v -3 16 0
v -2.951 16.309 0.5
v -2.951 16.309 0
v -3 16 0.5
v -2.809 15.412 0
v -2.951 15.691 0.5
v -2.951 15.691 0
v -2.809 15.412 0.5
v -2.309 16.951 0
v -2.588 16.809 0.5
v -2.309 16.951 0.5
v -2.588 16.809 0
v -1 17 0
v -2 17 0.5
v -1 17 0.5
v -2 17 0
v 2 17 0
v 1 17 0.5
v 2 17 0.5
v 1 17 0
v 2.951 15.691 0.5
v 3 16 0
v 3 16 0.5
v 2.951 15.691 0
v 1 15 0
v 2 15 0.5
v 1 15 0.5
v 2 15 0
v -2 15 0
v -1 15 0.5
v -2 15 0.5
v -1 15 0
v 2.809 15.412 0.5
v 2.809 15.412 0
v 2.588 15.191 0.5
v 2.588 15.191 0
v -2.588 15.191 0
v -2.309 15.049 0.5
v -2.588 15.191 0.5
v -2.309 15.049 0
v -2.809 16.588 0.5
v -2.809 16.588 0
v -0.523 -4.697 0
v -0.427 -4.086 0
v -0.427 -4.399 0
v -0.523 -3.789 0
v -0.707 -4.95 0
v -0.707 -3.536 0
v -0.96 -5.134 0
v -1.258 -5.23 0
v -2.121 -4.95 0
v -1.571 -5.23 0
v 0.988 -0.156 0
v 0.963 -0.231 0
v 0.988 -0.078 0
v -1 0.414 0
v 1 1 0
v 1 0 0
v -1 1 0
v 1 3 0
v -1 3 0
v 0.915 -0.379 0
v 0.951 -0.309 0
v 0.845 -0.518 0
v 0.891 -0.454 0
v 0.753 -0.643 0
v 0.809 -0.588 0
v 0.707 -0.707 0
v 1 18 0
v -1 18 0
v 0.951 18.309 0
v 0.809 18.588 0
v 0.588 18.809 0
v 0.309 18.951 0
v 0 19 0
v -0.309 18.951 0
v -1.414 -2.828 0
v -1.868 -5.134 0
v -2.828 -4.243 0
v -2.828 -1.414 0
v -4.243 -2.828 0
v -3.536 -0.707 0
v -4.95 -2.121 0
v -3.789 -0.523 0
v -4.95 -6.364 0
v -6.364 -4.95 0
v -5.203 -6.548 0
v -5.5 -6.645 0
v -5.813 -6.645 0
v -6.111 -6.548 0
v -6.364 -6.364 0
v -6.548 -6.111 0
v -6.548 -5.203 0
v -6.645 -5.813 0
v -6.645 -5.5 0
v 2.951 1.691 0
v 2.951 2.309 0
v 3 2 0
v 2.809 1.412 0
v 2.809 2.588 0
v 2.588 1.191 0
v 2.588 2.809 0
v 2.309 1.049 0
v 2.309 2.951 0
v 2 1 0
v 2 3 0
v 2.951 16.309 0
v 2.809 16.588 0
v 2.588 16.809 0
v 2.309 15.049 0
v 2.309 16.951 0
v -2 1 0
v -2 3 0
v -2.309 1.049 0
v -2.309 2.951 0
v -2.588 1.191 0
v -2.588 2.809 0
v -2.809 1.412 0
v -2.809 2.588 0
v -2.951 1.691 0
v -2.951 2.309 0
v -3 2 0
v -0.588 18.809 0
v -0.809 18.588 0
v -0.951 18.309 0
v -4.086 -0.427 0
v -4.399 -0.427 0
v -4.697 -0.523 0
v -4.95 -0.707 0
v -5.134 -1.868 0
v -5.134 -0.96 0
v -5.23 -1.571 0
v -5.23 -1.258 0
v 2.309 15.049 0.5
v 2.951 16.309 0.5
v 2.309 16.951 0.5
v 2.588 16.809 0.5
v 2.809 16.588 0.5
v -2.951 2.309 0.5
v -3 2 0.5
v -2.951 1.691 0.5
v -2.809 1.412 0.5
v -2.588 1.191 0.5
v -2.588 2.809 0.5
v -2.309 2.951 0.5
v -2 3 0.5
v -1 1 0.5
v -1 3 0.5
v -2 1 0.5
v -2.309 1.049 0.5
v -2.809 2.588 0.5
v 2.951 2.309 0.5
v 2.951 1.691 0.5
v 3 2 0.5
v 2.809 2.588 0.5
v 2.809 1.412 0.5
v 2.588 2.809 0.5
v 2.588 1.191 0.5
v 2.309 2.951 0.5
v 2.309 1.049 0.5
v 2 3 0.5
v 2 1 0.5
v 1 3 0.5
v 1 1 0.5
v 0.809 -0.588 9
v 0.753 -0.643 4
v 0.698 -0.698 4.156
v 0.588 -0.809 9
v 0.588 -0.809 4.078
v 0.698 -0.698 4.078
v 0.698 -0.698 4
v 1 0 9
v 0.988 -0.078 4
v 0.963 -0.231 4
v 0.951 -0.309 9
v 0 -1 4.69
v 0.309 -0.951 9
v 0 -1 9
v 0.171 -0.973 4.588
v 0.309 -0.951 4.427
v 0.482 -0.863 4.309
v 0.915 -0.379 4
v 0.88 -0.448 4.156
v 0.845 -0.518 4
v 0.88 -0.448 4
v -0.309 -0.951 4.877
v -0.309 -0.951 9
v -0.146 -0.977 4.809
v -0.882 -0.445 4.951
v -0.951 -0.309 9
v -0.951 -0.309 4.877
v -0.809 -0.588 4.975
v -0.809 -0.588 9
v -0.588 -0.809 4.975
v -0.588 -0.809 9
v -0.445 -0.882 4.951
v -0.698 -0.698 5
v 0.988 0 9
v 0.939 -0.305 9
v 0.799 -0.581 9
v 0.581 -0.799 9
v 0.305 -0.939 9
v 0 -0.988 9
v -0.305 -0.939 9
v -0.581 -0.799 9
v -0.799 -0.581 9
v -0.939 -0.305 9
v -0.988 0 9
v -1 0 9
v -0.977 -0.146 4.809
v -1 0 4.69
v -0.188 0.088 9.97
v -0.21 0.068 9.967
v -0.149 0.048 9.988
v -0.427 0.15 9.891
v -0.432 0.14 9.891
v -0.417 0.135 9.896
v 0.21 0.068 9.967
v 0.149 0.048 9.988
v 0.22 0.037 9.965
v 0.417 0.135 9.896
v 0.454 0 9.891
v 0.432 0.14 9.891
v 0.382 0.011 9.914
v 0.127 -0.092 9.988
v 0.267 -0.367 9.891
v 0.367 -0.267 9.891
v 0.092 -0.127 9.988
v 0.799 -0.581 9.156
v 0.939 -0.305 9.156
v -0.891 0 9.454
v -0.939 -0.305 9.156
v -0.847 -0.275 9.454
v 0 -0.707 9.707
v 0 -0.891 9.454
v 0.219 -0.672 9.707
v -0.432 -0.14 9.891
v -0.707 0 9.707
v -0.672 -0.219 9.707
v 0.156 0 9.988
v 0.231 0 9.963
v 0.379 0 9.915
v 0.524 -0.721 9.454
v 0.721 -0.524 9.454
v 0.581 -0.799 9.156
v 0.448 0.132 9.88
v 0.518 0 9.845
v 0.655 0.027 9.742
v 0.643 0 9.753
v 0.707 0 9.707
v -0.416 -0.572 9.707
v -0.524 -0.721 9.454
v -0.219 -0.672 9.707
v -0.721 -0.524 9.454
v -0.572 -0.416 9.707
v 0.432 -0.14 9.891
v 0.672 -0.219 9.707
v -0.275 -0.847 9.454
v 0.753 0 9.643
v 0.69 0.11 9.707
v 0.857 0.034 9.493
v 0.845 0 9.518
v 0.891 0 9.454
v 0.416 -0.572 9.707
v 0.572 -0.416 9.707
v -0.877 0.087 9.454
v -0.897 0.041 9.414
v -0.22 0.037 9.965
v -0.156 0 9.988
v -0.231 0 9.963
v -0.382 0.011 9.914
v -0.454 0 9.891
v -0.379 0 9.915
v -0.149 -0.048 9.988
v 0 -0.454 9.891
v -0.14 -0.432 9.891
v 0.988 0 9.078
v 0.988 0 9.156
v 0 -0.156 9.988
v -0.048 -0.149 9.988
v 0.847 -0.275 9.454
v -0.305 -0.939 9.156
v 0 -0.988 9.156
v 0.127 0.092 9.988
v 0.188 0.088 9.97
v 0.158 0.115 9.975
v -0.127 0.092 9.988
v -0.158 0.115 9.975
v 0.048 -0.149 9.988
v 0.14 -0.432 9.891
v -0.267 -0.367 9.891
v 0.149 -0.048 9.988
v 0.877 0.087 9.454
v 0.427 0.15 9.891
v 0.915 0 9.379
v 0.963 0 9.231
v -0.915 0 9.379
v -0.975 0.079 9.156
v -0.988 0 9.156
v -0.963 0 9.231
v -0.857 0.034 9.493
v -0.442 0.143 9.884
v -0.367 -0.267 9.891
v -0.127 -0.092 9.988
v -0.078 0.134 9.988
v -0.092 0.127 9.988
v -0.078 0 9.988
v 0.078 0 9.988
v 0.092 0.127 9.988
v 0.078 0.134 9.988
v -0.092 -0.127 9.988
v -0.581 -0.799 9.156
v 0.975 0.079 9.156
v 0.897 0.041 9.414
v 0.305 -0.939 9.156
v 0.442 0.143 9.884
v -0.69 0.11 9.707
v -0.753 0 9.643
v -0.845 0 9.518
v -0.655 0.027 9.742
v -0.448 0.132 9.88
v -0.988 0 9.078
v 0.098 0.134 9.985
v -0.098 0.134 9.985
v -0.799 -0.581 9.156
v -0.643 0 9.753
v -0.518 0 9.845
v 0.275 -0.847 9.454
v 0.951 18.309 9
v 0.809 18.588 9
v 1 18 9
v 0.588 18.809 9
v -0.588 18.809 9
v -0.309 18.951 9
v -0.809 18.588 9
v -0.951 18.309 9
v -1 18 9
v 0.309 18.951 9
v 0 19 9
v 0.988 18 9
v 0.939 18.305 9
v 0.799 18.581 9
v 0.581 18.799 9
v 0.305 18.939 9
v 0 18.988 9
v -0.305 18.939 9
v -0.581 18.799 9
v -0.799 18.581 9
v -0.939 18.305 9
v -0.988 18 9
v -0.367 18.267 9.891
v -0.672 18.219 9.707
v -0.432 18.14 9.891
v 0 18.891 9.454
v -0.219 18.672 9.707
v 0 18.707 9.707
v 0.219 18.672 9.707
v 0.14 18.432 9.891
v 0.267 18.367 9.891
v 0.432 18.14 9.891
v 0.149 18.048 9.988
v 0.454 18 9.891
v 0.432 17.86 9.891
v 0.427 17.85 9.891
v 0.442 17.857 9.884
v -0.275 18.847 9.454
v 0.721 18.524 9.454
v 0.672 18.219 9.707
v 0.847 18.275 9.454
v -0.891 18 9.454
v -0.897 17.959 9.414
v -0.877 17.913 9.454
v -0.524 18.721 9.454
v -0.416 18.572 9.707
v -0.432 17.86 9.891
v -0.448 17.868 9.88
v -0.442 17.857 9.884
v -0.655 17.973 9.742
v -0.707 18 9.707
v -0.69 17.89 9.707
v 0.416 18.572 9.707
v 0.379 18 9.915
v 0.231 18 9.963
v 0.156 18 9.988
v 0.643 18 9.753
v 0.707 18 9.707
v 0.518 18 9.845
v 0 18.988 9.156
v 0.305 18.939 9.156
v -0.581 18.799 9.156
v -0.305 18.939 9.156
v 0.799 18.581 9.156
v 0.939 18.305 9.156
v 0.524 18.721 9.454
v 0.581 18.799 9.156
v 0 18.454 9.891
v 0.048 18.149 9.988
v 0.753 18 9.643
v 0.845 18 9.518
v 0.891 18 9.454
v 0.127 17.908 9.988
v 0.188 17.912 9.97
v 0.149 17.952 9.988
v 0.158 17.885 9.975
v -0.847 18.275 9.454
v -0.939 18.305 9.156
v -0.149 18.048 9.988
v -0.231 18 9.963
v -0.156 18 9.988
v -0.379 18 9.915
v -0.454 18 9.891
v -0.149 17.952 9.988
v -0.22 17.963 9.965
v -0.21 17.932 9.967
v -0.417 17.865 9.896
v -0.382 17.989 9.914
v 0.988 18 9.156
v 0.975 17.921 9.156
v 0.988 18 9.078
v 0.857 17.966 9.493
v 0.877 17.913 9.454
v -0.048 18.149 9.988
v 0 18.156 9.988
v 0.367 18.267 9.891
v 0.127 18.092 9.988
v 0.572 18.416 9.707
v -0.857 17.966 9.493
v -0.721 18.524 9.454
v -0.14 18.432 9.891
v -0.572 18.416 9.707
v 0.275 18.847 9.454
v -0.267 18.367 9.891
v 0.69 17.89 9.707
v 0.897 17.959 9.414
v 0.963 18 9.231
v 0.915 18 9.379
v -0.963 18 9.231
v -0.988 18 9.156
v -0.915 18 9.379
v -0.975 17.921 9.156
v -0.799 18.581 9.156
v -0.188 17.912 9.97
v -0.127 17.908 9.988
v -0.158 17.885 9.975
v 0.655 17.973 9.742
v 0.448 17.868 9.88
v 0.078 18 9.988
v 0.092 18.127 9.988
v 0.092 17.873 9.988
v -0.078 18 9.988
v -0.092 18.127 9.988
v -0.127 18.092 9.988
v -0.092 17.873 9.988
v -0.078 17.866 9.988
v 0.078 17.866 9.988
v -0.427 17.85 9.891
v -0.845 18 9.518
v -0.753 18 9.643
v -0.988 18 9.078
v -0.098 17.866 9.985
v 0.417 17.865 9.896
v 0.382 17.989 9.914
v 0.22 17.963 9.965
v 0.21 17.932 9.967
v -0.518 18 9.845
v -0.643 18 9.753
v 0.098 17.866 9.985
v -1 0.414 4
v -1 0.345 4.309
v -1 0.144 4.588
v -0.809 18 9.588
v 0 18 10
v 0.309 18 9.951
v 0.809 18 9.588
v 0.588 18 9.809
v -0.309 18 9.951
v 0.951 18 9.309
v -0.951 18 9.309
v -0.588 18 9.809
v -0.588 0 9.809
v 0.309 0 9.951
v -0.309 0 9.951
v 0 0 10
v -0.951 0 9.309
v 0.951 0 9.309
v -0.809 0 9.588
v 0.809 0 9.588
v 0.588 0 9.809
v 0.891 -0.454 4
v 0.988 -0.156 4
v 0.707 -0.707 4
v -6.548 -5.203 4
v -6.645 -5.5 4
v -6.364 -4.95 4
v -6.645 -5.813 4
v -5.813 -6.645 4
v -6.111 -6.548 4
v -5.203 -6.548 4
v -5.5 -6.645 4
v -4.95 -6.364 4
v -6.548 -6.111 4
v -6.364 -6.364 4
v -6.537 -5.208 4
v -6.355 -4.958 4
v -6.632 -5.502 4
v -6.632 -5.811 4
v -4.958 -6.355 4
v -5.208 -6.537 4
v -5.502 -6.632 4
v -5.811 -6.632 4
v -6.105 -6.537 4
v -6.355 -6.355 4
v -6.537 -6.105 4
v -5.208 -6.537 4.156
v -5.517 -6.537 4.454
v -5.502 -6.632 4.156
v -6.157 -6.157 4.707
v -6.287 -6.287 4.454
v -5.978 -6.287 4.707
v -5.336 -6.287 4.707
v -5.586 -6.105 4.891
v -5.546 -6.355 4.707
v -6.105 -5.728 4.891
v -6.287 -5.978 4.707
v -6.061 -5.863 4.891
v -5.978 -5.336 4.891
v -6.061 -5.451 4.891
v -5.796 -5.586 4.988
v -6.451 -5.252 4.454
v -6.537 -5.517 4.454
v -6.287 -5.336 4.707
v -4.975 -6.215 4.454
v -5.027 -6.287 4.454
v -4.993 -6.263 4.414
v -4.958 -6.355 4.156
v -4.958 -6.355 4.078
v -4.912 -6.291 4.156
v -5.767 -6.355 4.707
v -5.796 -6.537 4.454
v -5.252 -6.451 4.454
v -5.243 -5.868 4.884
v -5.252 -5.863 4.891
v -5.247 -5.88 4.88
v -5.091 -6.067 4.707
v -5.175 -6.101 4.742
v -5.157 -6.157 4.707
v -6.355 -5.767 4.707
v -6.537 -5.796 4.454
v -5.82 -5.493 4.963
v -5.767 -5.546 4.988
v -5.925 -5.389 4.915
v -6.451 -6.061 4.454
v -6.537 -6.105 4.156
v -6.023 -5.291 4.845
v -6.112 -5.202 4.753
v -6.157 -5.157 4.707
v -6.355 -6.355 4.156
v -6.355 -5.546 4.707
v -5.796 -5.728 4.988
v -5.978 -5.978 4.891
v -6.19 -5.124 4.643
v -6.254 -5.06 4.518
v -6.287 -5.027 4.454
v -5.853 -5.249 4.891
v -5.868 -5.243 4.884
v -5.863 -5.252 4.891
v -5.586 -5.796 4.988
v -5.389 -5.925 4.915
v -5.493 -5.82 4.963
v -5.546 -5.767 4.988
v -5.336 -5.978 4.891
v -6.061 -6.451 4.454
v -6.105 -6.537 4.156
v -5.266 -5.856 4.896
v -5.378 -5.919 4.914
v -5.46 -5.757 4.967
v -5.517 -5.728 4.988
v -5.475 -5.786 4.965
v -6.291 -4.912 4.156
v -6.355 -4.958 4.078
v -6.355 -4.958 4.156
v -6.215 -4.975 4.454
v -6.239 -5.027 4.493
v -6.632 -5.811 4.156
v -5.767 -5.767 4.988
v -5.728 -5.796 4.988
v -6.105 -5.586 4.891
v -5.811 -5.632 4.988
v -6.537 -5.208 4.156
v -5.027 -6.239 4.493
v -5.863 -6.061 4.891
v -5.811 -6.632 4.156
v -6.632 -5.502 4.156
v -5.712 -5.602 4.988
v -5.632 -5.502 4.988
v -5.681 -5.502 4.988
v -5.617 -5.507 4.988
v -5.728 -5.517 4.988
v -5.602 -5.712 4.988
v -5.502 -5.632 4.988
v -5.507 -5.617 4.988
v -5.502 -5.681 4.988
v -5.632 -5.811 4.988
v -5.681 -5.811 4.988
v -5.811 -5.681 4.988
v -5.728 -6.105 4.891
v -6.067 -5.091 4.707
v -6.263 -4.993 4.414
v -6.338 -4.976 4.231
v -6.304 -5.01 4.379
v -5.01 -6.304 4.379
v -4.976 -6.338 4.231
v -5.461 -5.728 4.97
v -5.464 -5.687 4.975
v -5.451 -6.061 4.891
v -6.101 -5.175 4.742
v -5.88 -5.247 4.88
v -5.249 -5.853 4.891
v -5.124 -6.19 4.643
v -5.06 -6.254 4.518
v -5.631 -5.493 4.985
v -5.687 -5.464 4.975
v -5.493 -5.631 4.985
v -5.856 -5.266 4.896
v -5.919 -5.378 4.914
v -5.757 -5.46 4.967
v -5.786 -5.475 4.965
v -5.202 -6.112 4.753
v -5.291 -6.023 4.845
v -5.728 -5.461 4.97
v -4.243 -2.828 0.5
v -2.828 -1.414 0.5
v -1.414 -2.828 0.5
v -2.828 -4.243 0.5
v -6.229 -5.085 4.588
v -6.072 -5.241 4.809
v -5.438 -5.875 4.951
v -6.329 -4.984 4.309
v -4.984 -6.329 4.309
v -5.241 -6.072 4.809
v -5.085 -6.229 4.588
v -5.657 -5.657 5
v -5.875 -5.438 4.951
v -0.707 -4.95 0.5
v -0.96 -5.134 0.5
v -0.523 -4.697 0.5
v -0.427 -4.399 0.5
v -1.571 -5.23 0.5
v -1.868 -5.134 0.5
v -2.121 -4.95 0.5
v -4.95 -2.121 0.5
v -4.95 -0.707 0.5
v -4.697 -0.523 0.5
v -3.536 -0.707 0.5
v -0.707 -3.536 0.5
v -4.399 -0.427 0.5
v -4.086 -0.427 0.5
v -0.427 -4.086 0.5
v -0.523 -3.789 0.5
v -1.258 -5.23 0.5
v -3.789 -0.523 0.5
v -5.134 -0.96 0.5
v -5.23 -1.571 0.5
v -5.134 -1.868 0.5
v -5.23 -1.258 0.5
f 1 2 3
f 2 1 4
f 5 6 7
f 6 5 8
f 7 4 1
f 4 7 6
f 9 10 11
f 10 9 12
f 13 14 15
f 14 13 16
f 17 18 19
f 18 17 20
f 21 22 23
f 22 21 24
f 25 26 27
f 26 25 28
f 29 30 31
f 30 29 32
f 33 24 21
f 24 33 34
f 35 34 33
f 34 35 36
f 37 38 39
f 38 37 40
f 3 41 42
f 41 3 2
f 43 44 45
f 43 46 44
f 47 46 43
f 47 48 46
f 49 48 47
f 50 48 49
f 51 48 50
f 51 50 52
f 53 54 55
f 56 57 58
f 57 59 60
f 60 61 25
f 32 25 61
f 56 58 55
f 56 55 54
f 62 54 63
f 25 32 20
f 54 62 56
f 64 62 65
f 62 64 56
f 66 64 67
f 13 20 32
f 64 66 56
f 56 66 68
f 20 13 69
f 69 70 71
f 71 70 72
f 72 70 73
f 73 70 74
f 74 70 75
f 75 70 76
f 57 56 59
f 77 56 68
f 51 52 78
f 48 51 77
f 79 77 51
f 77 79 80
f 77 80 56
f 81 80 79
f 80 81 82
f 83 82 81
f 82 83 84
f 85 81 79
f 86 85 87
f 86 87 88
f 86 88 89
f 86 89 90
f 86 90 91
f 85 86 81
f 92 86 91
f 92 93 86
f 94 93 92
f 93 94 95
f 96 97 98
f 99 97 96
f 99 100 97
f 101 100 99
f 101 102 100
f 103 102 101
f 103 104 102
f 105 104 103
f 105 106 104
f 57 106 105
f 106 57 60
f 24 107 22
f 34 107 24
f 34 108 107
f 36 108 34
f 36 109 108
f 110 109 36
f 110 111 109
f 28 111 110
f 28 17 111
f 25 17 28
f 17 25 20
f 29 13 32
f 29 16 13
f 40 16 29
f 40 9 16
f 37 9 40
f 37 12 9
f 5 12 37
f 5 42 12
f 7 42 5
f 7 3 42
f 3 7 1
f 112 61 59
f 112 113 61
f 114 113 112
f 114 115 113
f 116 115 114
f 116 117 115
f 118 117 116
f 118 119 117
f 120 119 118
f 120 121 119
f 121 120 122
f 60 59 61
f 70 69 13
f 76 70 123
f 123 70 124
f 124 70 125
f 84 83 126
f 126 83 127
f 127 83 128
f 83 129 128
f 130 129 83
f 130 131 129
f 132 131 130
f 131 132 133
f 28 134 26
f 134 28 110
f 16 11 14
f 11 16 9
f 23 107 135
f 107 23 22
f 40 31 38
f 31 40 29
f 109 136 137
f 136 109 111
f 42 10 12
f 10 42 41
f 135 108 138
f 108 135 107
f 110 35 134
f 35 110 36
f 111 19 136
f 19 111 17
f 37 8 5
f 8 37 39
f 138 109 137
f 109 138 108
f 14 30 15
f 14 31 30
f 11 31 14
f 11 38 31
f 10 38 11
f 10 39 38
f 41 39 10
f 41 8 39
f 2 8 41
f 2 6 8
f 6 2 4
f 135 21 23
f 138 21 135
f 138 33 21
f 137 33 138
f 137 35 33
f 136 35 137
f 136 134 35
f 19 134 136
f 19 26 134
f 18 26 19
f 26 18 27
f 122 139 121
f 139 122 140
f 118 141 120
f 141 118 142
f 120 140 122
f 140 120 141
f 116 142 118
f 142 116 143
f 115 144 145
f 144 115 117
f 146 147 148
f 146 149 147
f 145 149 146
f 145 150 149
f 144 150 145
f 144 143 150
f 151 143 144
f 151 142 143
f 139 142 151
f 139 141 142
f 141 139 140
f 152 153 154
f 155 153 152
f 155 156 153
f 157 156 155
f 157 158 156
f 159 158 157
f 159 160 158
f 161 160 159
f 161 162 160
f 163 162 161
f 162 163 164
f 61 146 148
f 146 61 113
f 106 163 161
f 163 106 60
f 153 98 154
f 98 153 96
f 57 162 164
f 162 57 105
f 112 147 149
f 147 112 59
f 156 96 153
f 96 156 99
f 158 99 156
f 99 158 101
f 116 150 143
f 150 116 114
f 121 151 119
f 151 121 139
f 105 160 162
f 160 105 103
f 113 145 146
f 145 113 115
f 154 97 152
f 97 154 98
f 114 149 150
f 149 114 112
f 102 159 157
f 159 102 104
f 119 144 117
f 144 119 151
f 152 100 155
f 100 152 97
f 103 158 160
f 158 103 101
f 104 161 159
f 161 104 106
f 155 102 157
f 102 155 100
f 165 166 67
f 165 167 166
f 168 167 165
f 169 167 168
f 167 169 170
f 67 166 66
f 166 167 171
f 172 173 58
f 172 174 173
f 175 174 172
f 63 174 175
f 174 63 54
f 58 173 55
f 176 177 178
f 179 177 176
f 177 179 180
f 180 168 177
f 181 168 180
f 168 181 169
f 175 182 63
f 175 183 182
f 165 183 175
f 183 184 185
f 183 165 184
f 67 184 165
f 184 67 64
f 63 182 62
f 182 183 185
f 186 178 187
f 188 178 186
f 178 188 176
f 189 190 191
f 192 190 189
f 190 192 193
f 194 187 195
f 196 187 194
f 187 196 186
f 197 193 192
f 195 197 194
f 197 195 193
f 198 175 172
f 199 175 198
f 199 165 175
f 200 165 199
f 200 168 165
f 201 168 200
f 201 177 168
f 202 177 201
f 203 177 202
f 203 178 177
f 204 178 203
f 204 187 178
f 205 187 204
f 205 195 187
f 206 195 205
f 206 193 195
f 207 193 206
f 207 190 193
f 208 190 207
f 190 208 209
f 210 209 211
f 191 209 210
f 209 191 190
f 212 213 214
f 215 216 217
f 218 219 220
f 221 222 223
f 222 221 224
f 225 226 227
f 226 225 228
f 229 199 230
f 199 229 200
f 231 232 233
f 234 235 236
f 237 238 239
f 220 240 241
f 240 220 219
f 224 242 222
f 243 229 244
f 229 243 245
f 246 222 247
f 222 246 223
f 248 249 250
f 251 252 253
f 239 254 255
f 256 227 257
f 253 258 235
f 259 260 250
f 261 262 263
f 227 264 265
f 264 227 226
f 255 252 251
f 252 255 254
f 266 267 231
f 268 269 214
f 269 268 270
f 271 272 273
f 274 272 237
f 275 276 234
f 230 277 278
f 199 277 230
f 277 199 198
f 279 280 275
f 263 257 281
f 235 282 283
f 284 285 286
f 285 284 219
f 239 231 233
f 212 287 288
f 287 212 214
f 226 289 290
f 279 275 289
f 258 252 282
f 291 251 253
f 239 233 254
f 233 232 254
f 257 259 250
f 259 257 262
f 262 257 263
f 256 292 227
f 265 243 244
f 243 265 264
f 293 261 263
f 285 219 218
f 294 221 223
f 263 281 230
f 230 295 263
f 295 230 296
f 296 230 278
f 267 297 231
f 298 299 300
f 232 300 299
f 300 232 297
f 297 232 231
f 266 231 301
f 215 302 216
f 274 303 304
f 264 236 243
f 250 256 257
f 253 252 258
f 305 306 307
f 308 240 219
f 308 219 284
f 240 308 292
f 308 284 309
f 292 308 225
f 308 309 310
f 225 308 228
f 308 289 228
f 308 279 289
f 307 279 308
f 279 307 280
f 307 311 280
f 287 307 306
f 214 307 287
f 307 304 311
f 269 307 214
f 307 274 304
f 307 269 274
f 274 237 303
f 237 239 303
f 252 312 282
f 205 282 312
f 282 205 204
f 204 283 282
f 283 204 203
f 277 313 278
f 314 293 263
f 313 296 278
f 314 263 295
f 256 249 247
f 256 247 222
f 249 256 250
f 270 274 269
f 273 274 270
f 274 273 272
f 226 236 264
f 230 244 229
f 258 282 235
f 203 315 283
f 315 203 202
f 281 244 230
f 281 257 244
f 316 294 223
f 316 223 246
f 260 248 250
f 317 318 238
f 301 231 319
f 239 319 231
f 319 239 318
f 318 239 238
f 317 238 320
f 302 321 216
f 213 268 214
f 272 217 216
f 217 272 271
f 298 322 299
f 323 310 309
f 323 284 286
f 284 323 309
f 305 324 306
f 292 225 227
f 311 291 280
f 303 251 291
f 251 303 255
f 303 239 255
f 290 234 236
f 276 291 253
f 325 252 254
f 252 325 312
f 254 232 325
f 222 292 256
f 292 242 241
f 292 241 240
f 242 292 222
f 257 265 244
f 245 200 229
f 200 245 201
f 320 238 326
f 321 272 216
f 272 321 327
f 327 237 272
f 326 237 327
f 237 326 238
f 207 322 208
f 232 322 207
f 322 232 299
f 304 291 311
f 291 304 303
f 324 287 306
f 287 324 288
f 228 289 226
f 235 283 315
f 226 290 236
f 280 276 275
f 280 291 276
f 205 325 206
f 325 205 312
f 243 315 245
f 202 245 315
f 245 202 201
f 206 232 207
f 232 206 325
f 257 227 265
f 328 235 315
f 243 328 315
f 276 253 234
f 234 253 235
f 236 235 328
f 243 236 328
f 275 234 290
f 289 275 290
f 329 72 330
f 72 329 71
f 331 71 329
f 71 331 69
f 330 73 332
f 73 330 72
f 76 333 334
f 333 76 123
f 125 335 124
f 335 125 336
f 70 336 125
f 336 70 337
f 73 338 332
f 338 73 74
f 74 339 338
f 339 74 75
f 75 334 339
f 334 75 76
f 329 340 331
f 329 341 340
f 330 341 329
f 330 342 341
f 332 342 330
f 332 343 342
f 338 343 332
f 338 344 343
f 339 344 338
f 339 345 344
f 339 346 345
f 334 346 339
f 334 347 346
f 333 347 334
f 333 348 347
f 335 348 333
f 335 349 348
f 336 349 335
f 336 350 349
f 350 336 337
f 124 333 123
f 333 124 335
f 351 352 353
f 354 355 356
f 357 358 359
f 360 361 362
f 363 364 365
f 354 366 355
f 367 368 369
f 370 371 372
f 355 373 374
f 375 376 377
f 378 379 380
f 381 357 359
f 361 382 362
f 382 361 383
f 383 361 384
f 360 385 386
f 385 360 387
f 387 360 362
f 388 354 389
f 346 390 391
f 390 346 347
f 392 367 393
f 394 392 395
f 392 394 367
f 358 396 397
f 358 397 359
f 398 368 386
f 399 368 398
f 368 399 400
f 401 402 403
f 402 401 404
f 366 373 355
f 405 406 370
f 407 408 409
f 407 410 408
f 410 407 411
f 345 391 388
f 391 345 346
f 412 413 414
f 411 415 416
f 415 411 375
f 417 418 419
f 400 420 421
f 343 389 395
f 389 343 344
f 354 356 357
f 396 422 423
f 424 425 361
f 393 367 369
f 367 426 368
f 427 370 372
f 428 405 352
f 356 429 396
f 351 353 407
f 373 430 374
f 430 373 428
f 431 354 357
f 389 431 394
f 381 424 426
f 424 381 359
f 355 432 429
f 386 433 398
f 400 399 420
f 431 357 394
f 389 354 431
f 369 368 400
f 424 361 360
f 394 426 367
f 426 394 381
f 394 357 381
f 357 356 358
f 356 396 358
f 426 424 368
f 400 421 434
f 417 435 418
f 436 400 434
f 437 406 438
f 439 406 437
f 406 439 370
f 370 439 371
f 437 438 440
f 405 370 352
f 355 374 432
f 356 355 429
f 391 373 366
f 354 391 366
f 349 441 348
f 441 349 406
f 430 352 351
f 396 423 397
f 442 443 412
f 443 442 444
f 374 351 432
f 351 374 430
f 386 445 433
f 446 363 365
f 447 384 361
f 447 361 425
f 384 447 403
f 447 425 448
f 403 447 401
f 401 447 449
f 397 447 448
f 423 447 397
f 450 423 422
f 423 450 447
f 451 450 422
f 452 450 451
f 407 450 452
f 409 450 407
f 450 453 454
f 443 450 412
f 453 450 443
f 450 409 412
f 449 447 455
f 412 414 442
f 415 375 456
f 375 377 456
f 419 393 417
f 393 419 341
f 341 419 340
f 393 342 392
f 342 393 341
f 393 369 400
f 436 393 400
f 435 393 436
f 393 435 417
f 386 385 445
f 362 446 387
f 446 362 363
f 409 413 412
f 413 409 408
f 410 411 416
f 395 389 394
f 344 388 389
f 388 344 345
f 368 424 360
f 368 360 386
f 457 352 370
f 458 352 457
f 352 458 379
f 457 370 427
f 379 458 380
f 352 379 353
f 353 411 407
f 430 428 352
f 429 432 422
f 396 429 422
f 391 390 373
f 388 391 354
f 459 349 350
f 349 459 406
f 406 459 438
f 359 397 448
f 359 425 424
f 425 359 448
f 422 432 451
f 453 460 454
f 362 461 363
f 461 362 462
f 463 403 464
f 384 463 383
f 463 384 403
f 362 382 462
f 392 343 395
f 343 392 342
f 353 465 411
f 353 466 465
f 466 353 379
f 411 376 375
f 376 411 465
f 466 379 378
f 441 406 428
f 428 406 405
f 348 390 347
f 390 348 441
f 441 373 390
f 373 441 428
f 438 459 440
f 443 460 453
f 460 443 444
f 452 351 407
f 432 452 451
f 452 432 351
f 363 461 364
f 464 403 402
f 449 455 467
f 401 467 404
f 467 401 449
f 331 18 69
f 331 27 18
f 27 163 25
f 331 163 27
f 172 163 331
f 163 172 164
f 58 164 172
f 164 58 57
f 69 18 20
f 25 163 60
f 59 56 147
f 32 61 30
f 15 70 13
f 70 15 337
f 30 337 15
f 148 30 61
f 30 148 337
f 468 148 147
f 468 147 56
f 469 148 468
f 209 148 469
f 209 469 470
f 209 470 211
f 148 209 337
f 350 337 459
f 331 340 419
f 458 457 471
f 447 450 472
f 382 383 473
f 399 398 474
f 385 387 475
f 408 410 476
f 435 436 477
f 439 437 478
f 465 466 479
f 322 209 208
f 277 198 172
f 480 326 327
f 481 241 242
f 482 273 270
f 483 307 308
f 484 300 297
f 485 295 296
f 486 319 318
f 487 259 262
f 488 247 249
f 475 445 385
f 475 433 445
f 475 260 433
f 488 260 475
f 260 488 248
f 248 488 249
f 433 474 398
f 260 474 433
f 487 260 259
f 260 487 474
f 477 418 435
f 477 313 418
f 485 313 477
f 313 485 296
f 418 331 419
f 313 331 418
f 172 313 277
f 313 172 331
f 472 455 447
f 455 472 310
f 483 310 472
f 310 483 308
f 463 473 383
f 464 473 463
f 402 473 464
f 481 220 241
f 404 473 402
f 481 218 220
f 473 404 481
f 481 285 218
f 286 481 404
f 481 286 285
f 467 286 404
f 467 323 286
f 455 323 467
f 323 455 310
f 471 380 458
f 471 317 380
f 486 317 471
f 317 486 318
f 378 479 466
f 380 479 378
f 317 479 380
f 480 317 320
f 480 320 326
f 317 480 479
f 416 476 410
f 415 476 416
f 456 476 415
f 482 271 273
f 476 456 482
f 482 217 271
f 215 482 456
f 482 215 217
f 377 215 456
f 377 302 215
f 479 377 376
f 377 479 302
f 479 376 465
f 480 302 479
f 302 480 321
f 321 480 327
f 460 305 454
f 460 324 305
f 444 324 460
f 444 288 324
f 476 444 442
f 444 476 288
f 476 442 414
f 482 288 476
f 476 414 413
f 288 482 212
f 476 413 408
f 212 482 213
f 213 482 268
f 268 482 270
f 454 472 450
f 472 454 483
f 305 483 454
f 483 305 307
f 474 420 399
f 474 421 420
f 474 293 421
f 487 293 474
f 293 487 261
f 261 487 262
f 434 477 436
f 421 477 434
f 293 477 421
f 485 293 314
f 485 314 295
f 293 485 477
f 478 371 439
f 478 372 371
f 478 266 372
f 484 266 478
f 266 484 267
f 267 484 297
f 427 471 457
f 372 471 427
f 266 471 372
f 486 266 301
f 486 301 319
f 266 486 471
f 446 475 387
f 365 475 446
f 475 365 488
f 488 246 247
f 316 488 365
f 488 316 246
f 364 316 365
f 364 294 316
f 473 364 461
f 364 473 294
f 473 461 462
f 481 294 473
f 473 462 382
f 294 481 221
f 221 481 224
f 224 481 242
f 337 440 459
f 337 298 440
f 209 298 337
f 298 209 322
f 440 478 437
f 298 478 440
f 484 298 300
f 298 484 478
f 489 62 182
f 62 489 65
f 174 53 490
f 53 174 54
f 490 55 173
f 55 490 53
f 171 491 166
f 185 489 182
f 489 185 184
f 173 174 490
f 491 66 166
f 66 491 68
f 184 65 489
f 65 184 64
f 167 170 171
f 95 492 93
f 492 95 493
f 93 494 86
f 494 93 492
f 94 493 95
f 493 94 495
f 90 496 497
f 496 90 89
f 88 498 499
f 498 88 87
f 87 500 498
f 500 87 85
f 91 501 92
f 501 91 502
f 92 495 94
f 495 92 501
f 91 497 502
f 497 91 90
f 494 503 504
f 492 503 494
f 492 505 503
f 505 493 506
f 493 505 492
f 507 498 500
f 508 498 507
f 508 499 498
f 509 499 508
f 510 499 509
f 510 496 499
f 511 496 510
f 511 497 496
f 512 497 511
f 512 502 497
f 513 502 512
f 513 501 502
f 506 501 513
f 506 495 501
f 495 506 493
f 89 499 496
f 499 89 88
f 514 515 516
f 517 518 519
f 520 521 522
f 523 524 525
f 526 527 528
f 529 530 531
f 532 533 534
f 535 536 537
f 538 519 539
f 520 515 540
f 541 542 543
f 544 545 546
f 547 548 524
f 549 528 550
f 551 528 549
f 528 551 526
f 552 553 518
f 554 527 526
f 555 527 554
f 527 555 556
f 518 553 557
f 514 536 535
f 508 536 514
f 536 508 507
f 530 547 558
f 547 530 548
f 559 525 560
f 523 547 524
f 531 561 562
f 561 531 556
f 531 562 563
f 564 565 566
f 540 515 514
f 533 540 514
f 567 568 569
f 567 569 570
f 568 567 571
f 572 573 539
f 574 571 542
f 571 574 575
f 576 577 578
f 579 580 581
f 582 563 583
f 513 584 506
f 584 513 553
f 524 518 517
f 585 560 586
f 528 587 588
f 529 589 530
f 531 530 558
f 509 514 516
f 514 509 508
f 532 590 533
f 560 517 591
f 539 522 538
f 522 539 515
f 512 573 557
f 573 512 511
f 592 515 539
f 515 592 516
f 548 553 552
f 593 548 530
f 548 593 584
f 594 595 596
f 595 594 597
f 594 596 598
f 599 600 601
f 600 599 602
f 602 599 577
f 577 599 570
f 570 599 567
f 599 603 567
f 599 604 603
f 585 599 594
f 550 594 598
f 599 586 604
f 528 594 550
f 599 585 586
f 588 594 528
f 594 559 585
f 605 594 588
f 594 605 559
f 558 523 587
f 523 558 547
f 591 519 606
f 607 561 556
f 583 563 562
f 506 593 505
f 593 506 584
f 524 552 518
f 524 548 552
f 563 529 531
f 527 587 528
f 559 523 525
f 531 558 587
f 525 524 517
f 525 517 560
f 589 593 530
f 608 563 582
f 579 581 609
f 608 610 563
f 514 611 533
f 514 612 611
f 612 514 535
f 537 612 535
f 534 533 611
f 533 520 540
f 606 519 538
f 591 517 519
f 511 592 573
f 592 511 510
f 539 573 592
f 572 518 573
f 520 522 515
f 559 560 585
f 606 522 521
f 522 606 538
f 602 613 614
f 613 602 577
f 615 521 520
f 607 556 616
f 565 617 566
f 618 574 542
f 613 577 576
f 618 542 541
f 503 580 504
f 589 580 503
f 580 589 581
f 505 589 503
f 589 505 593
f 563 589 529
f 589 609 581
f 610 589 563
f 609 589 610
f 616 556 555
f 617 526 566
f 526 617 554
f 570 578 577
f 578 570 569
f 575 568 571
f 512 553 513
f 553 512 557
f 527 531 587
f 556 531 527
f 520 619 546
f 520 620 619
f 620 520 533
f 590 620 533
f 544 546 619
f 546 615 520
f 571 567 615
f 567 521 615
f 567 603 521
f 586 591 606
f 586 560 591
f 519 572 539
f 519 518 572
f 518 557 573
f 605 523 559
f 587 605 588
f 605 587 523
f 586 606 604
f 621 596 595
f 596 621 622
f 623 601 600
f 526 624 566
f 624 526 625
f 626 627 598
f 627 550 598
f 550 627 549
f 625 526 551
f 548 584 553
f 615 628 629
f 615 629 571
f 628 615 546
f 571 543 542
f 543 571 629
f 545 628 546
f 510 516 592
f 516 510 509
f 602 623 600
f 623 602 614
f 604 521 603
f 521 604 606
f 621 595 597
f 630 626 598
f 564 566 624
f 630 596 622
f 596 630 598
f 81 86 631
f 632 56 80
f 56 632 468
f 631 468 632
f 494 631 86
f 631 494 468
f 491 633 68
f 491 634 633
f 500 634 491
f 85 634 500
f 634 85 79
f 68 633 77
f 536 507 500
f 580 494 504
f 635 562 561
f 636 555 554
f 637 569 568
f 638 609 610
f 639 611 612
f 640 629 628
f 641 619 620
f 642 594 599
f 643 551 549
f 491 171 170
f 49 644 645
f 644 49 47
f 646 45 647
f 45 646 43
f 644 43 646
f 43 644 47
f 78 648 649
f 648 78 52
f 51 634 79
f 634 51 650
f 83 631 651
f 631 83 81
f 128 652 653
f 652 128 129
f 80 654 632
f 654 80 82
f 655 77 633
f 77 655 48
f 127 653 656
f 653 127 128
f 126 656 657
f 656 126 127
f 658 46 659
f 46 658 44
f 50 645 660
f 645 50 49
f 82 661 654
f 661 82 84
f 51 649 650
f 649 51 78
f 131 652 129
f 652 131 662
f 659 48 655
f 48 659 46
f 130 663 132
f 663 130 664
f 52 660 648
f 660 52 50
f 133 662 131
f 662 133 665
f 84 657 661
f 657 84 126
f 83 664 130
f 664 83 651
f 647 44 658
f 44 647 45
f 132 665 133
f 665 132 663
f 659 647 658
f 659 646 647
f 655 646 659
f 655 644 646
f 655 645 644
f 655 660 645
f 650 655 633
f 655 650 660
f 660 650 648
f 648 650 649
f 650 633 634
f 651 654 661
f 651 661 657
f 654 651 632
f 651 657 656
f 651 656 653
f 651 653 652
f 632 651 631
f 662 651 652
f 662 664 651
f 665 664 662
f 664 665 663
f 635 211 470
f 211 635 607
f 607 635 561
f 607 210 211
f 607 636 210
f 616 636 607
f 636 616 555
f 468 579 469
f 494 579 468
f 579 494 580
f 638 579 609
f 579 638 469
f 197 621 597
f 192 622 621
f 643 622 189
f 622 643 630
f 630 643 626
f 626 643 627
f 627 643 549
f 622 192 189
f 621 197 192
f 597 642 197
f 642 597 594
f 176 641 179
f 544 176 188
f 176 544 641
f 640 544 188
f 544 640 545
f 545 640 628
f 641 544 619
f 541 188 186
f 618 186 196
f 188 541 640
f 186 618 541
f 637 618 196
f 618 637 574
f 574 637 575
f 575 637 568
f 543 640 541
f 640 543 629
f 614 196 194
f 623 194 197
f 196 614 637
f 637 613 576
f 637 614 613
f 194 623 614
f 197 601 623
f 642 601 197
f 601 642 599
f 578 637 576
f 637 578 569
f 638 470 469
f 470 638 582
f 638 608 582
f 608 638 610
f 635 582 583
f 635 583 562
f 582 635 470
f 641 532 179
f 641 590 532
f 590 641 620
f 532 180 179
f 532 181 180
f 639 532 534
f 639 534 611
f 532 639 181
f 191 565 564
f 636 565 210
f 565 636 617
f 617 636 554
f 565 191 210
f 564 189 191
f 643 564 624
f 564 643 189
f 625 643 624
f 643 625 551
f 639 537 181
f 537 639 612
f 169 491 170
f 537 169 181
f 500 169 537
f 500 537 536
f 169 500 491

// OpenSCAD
$fn = 20;

apothem = 25 / 2;
diagonal = apothem * 2.3094;

module cap(height, length, thickness) {
    cylinder(h = height - thickness / 2, d = thickness);
    translate(v = [0, 0, height - thickness / 2])
        sphere(d = thickness);
}

module foot(width = 2, length = 6, height = 0.5) {
    linear_extrude(height = height, center = false){
        square(size = [length - width, width], center = true);
        translate([ (length-width) / 2, 0, 0]) circle(d = width);
        translate([-(length-width) / 2, 0, 0]) circle(d = width);
    }
}

module wall(height = 10, length = 20, thickness = 2) {
    // Main wall portion
    translate([ - thickness / 2, 0, 0 ])
        cube([thickness, length - thickness, height - thickness / 2]);
    // Add feet
    footWidth = 2;
    if (length < 15) {
        translate([0, length/2 - thickness / 2, 0]) foot(footWidth);
    }
    else {
        translate([0, length - thickness * 2, 0]) foot(footWidth);
        translate([0, thickness, 0]) foot(footWidth);
    }
    // Add rounded top
    translate([0 , 0, height - thickness / 2]) rotate([-90, 0, 0]) 
            cylinder(h = length - thickness, d = thickness);
    // Add rounded ends
    cap(height, length, thickness);
    translate([0, length - thickness, 0]) cap(height, length, thickness);
}

wall(10, 20);
rotate(a = 180-45) wall(height = 5, length = 10, thickness = 2); 
//foot();
